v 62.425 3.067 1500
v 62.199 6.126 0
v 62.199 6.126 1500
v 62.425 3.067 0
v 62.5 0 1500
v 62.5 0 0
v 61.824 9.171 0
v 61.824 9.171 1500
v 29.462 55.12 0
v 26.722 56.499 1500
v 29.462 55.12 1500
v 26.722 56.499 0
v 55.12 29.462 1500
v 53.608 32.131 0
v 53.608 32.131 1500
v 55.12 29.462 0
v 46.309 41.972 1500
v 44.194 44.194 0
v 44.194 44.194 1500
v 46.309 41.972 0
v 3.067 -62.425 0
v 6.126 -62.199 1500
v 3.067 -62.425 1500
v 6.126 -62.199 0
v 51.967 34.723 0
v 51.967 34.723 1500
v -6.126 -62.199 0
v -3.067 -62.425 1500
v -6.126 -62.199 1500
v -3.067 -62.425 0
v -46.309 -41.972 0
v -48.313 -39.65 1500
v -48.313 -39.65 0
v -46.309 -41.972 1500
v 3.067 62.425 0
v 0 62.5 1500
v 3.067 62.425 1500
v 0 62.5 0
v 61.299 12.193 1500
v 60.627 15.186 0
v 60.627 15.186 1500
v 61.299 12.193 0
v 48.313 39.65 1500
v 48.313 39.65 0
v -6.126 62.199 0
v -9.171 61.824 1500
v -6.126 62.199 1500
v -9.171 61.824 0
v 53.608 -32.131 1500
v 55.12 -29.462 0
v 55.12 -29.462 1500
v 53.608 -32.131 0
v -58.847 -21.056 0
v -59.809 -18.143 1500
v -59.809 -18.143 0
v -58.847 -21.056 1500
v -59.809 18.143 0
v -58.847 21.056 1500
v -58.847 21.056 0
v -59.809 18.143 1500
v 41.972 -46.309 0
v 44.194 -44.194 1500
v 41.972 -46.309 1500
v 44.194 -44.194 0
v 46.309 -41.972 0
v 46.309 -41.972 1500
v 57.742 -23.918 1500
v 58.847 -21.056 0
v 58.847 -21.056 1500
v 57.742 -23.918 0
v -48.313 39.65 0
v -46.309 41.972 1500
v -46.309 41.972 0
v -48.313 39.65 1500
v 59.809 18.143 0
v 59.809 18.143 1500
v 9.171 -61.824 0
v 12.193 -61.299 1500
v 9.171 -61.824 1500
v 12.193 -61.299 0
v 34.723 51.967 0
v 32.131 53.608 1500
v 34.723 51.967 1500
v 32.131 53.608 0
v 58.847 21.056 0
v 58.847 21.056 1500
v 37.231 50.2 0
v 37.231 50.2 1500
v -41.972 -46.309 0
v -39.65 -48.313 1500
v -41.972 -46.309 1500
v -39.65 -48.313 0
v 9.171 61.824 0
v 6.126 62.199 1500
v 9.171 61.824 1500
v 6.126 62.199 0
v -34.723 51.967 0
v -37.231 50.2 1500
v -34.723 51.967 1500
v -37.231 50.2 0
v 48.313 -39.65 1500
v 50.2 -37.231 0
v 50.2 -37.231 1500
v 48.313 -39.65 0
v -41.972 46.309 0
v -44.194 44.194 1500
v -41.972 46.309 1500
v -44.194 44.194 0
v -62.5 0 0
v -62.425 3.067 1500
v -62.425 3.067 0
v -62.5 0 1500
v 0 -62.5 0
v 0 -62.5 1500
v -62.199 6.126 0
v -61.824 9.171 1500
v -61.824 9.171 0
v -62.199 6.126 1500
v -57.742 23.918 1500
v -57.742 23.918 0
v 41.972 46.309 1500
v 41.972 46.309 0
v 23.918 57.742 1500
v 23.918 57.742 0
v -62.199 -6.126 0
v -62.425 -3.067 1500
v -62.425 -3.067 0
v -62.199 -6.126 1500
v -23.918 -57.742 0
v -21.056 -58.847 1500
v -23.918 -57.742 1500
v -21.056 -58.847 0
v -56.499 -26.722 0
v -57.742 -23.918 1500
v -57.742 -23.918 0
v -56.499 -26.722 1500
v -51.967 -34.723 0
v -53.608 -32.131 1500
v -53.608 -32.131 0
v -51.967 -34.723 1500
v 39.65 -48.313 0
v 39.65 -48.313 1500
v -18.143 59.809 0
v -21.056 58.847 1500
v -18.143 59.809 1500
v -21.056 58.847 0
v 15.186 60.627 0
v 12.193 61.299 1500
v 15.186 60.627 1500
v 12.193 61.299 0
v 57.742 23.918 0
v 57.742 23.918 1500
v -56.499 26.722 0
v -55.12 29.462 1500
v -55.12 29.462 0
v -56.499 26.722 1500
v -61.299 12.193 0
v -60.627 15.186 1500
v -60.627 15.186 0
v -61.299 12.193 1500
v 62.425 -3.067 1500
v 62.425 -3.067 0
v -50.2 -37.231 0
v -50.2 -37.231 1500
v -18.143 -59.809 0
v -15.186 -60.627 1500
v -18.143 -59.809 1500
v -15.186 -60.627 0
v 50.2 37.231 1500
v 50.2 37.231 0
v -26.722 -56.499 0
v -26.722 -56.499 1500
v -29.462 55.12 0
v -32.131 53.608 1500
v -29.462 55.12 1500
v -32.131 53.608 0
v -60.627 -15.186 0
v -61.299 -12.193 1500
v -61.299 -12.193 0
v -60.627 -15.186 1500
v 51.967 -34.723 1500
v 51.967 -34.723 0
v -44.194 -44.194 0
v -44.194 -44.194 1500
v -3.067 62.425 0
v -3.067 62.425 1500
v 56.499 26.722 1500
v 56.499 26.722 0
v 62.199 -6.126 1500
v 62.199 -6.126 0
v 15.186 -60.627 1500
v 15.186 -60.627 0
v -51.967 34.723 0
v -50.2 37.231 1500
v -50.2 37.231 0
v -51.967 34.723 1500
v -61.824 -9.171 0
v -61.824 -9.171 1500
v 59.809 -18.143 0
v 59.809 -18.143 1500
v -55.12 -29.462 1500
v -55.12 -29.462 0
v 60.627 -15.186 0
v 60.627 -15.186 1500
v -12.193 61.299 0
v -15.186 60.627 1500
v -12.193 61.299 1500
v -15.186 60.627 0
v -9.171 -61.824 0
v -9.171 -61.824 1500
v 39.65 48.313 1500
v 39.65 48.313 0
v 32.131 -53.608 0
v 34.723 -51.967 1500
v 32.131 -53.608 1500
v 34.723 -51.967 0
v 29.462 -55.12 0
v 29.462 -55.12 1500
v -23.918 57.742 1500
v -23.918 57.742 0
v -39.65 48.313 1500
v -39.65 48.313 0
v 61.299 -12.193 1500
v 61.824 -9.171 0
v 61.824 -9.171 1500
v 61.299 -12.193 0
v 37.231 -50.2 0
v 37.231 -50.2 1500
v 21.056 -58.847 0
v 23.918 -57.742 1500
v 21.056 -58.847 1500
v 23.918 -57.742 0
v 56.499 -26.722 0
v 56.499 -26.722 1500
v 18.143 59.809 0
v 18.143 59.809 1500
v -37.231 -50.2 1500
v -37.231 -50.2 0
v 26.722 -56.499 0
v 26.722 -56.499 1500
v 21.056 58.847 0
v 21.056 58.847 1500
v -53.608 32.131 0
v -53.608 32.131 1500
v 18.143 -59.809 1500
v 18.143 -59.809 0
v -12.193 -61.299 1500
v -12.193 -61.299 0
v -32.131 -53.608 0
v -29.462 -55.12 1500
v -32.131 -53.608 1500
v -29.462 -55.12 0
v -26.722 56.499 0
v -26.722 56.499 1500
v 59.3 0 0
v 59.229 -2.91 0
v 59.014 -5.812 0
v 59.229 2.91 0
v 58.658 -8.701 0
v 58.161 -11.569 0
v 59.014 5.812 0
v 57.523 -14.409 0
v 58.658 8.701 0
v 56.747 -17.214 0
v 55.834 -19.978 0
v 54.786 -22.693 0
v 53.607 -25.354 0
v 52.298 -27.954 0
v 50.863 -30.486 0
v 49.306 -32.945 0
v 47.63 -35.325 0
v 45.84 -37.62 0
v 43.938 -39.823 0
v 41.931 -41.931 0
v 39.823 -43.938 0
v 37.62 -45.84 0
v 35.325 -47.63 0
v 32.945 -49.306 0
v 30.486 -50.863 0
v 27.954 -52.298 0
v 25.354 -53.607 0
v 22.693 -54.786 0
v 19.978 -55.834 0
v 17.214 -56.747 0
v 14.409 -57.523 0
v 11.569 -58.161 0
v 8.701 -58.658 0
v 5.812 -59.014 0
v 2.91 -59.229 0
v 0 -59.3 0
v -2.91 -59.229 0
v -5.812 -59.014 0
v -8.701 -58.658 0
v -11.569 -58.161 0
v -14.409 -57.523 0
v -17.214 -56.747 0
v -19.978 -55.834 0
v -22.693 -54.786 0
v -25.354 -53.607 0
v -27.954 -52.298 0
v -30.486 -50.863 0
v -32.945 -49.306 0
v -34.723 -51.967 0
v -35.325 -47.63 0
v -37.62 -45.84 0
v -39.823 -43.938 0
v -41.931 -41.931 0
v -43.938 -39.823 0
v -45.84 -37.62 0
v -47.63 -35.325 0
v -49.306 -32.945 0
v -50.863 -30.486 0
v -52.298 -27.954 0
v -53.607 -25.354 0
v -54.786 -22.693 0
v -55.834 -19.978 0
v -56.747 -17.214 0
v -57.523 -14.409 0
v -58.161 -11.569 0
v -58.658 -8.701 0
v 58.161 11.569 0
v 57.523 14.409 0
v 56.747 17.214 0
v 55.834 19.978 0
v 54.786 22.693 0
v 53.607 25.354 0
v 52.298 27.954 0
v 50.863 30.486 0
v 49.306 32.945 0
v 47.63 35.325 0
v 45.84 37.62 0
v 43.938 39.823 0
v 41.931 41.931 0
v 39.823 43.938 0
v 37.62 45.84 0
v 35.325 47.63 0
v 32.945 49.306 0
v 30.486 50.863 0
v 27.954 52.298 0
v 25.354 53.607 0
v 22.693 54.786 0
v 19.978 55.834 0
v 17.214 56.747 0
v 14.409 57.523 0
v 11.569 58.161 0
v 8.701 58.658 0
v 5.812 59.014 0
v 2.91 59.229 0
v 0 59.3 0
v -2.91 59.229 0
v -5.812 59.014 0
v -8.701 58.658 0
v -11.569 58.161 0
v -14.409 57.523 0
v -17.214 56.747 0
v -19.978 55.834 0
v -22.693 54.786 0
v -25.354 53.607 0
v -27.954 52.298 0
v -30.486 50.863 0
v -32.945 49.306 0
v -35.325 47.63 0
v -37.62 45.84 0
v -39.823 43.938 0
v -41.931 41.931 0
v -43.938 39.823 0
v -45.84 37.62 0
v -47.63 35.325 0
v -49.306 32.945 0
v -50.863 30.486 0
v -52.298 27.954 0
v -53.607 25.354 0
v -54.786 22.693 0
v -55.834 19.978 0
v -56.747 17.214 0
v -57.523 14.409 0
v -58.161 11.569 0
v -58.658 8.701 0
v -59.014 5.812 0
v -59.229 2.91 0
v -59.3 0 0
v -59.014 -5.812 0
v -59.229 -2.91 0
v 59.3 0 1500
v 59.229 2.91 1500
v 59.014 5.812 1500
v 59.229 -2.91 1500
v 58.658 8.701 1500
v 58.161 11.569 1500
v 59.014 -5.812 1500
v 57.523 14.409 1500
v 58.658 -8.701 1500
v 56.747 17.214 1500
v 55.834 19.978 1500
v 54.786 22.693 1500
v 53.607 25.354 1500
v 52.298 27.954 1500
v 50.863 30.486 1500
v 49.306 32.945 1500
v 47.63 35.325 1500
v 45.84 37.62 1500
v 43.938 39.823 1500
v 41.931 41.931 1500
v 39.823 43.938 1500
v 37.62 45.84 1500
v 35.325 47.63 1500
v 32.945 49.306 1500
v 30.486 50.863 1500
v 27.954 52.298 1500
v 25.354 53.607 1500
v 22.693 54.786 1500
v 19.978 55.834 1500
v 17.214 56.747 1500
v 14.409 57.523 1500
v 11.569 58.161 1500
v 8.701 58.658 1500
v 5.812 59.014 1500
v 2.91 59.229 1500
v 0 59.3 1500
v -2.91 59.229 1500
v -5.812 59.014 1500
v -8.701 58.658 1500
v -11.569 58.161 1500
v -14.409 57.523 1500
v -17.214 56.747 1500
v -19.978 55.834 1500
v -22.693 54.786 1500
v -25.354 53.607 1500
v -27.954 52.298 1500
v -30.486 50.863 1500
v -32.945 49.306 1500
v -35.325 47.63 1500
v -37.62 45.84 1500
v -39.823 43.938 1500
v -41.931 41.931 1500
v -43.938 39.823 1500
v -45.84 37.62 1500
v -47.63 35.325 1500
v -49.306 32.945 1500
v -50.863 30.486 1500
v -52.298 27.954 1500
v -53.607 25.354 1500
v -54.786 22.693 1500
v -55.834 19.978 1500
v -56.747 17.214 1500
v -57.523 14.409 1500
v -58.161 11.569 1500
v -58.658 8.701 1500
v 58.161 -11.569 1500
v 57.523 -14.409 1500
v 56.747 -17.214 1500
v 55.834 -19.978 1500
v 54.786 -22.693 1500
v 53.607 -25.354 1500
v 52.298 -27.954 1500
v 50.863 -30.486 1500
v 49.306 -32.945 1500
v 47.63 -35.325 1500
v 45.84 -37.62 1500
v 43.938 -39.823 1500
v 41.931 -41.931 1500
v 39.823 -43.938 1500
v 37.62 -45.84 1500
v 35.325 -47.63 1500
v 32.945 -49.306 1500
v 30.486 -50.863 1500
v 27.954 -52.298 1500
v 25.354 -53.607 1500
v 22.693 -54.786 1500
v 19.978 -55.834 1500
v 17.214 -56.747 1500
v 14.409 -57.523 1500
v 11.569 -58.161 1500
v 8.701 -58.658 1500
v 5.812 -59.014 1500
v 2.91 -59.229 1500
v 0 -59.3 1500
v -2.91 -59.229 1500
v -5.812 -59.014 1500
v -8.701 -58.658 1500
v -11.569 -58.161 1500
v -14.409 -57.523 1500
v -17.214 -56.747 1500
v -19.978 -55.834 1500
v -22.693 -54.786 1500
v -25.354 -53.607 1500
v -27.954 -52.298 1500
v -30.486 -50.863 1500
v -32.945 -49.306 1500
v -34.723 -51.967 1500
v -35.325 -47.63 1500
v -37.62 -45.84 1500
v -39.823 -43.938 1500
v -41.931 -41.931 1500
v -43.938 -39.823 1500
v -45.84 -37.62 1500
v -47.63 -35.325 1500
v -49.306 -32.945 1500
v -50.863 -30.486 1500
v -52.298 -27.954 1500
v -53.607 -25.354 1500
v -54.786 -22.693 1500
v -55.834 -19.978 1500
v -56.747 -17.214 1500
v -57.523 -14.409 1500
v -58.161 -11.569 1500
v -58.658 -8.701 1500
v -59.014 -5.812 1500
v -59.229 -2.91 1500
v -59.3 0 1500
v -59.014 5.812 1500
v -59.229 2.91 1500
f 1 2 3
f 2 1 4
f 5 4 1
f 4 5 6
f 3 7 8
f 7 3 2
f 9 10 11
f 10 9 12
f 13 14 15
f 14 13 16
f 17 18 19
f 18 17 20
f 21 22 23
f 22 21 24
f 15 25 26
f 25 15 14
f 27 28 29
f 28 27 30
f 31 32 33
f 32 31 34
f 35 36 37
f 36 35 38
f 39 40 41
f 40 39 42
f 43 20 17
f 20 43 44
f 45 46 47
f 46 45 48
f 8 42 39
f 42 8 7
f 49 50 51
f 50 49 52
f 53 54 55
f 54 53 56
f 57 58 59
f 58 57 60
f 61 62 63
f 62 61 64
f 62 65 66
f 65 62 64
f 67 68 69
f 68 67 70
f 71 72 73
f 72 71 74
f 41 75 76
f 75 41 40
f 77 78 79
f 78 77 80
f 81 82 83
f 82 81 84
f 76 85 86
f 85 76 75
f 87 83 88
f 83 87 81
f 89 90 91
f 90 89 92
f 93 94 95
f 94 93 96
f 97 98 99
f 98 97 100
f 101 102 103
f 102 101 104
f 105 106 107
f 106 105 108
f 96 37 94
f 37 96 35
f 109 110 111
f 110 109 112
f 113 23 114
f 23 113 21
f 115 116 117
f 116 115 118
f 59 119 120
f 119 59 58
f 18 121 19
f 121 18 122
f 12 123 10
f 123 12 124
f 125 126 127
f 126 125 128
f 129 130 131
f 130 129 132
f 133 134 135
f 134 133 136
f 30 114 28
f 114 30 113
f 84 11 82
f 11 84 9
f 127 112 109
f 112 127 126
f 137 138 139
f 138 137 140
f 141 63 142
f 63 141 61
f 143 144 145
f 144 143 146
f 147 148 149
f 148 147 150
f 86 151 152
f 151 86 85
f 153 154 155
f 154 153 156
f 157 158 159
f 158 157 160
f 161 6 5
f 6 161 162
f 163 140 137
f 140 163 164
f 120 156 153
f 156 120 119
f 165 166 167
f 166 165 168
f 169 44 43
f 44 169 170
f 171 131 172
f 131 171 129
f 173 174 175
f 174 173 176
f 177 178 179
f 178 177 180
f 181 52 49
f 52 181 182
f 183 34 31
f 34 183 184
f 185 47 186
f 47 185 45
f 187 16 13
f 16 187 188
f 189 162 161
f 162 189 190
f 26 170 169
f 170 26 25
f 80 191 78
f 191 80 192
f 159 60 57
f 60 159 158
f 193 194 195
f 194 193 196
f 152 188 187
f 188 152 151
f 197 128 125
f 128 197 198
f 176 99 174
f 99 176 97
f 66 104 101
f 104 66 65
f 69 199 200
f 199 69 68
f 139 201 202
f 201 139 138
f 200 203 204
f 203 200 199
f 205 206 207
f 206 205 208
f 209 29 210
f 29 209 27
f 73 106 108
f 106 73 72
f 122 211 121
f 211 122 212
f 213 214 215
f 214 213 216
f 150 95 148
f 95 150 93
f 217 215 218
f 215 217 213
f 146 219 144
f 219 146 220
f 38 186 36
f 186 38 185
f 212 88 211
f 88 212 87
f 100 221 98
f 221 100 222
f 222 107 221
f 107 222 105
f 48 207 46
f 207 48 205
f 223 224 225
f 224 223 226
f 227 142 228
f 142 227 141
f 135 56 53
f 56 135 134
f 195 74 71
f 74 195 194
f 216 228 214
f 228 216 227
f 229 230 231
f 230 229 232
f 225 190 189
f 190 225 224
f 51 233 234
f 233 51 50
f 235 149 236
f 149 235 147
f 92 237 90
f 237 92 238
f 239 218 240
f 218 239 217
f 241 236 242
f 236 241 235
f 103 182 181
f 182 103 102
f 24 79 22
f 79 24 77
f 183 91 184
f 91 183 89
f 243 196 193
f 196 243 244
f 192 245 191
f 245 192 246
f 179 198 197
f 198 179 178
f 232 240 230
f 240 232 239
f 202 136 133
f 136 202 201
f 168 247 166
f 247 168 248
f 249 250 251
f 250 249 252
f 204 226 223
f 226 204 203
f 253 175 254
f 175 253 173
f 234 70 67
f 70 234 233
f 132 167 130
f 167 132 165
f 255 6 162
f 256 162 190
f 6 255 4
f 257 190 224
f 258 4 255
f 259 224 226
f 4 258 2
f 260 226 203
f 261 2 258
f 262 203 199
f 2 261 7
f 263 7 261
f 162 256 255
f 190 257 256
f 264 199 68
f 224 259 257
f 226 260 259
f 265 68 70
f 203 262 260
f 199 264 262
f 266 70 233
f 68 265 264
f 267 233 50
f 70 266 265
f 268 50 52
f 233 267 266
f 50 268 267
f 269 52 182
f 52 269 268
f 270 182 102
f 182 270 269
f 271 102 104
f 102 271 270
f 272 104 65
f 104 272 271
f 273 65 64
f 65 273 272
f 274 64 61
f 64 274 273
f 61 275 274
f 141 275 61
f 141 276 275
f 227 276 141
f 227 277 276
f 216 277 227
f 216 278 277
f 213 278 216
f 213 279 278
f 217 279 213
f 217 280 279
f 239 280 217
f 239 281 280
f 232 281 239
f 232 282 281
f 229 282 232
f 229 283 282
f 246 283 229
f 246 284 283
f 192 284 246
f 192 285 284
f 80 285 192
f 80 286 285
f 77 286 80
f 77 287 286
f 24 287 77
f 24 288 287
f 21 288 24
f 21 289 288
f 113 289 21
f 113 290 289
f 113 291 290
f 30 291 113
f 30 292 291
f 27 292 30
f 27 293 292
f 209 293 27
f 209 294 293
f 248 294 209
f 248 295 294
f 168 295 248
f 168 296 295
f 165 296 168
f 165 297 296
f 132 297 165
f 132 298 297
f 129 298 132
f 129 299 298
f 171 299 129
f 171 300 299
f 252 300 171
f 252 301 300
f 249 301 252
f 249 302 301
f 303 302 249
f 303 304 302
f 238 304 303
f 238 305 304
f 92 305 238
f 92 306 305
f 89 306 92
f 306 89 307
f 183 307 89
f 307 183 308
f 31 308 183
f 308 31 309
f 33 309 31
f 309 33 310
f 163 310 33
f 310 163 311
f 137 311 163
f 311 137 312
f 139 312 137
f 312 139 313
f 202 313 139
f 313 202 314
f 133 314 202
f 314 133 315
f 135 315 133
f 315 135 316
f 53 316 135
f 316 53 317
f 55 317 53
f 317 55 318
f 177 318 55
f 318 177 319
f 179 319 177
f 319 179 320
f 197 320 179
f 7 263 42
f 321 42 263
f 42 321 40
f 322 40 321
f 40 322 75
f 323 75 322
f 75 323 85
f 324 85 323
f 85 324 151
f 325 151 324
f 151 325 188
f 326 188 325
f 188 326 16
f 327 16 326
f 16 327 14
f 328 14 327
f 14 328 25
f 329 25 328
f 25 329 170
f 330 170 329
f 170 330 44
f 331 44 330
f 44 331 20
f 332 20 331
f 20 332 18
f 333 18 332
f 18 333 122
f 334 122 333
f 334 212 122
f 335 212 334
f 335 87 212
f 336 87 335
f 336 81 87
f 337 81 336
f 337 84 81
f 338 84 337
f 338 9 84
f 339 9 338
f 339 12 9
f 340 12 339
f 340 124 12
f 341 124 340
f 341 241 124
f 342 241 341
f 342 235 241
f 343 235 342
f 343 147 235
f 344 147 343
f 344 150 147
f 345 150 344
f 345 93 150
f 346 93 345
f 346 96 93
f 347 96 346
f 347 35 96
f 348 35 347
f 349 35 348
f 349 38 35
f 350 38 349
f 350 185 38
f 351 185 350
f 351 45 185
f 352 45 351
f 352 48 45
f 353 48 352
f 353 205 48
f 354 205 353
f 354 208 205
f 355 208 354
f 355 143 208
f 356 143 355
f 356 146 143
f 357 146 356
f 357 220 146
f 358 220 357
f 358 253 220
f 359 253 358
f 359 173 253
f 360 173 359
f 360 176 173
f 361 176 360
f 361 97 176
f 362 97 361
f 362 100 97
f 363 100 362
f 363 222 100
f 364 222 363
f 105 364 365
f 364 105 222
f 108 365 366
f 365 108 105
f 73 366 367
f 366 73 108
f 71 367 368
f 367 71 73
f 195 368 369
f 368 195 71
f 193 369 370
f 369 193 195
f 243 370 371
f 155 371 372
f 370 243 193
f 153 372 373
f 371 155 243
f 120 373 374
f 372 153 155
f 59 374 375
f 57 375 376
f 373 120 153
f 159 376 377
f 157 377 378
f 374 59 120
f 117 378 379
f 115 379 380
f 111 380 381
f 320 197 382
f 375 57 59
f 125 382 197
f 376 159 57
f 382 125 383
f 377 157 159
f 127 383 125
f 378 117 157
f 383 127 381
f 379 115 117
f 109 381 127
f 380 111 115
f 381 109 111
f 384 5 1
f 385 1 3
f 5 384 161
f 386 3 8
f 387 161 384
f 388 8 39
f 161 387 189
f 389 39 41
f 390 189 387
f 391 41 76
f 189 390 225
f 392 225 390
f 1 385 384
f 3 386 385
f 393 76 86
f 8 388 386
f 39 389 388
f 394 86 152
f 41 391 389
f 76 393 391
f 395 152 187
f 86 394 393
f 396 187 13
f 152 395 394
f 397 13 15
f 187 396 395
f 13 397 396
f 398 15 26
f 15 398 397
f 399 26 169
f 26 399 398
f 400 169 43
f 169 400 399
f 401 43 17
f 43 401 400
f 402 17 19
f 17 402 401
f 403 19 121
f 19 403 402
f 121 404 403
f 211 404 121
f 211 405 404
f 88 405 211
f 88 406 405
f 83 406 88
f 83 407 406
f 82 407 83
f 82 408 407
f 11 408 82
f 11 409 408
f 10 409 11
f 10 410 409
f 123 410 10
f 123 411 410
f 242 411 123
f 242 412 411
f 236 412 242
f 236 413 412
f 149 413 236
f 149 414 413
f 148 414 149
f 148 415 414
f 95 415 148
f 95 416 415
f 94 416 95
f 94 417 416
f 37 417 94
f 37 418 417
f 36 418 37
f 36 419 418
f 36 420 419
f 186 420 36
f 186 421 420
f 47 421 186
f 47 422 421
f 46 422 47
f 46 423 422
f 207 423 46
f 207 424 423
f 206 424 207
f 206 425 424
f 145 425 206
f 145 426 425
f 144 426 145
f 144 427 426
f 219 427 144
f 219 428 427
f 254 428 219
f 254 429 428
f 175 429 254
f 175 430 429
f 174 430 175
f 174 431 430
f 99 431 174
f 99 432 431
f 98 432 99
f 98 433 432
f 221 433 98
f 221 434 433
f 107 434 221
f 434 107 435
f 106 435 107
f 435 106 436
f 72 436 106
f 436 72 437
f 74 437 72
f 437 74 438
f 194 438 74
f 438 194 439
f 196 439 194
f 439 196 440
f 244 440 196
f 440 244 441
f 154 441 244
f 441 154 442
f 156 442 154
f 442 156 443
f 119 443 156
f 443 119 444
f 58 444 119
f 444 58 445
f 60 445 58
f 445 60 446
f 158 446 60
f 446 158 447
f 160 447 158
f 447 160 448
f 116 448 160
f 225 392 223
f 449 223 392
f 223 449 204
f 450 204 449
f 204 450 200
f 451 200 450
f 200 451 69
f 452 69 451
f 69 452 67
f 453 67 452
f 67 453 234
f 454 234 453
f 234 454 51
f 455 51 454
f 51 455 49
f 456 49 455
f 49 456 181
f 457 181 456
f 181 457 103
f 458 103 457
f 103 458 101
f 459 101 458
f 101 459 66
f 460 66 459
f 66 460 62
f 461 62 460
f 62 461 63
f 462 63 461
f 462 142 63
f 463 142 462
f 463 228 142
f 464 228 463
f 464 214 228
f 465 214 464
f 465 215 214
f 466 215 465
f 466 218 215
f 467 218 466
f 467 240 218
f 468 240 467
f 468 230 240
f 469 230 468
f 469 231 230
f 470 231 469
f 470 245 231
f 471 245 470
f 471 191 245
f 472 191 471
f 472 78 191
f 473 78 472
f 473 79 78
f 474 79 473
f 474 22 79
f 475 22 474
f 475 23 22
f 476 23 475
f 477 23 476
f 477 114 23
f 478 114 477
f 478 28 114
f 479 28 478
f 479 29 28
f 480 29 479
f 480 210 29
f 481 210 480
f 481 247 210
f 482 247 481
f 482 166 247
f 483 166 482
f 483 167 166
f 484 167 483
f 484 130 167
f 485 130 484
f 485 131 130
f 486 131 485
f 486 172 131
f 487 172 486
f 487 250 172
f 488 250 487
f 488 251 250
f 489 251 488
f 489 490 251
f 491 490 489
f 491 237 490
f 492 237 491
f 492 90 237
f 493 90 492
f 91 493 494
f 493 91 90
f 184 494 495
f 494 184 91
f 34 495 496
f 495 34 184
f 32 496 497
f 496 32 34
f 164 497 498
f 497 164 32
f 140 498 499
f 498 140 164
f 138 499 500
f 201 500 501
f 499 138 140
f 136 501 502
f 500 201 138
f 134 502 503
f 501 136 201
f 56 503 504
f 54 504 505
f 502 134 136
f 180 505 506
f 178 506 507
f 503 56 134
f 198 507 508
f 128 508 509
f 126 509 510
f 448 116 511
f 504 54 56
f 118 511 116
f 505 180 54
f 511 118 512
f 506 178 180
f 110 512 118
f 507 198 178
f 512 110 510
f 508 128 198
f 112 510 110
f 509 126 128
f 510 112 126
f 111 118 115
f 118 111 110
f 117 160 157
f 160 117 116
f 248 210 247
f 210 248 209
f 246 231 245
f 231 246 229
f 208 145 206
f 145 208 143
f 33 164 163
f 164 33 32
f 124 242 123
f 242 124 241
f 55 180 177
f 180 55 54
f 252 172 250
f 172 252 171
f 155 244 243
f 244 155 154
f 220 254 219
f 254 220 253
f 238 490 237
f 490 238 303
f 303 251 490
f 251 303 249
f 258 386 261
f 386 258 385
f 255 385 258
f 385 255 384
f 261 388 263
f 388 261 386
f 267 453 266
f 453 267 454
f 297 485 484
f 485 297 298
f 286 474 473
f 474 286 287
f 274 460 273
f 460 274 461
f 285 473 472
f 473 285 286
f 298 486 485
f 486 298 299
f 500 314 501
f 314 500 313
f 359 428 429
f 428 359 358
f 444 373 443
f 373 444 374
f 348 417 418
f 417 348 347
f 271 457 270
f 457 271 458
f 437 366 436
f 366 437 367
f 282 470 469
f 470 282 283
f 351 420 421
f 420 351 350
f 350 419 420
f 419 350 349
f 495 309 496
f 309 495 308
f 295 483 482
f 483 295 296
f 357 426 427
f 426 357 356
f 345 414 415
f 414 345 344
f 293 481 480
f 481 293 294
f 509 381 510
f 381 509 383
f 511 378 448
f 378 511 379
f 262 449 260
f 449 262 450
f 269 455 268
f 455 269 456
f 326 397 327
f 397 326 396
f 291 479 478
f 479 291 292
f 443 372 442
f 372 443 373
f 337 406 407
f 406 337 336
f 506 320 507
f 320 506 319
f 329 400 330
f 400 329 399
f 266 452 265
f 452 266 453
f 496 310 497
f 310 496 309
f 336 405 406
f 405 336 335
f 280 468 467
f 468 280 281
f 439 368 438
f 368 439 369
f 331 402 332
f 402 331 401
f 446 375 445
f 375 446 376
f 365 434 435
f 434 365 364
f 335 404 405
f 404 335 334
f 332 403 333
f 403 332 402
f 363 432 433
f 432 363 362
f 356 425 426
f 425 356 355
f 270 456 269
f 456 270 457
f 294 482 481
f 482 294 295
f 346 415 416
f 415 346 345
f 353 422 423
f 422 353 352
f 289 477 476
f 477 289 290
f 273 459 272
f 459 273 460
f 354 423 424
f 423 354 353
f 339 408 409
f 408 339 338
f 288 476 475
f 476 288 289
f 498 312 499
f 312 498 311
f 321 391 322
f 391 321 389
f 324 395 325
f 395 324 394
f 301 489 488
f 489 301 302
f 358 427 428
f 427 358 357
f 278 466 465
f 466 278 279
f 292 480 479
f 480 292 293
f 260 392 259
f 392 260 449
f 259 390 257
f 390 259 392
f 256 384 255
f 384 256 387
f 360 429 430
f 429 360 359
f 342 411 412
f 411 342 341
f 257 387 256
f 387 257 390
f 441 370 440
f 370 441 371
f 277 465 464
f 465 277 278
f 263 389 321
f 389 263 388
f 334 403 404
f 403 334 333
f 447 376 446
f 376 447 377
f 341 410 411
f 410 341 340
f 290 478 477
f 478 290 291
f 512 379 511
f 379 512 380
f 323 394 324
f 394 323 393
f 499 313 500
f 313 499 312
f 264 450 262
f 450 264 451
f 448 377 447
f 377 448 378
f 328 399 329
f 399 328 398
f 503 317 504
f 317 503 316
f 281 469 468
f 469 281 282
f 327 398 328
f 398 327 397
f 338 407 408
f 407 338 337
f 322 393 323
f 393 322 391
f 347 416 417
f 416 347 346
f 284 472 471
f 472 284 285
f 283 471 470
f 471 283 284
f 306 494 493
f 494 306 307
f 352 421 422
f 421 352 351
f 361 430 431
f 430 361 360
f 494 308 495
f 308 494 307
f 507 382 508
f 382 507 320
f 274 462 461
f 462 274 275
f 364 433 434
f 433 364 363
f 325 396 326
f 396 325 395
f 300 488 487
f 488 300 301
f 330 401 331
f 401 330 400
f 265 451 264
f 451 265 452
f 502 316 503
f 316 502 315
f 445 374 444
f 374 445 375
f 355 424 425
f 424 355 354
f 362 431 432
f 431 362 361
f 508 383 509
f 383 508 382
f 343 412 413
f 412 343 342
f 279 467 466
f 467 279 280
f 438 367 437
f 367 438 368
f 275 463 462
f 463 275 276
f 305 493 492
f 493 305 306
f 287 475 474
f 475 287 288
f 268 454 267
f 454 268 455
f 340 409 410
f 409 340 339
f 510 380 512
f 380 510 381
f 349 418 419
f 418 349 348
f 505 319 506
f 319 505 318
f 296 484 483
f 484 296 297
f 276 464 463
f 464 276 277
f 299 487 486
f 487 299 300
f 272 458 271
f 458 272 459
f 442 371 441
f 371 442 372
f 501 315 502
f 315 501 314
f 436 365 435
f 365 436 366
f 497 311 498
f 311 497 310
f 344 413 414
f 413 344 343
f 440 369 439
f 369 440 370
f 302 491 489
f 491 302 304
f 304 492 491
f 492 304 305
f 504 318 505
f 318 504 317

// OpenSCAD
$fn = 128;

// HT pipe parameters (approximate for HT 125)
pipe_length = 1500;          // mm
outer_diameter = 125;        // mm (nominal)
wall_thickness = 3.2;        // mm (typical for HT DN125; adjust if needed)

outer_radius = outer_diameter/2;
inner_radius = outer_radius - wall_thickness;

module ht_pipe(od, t, L) {
    difference() {
        cylinder(h=L, r=od/2, center=false);
        translate([0,0,-0.5])
            cylinder(h=L+1, r=od/2 - t, center=false);
    }
}

ht_pipe(outer_diameter, wall_thickness, pipe_length);
